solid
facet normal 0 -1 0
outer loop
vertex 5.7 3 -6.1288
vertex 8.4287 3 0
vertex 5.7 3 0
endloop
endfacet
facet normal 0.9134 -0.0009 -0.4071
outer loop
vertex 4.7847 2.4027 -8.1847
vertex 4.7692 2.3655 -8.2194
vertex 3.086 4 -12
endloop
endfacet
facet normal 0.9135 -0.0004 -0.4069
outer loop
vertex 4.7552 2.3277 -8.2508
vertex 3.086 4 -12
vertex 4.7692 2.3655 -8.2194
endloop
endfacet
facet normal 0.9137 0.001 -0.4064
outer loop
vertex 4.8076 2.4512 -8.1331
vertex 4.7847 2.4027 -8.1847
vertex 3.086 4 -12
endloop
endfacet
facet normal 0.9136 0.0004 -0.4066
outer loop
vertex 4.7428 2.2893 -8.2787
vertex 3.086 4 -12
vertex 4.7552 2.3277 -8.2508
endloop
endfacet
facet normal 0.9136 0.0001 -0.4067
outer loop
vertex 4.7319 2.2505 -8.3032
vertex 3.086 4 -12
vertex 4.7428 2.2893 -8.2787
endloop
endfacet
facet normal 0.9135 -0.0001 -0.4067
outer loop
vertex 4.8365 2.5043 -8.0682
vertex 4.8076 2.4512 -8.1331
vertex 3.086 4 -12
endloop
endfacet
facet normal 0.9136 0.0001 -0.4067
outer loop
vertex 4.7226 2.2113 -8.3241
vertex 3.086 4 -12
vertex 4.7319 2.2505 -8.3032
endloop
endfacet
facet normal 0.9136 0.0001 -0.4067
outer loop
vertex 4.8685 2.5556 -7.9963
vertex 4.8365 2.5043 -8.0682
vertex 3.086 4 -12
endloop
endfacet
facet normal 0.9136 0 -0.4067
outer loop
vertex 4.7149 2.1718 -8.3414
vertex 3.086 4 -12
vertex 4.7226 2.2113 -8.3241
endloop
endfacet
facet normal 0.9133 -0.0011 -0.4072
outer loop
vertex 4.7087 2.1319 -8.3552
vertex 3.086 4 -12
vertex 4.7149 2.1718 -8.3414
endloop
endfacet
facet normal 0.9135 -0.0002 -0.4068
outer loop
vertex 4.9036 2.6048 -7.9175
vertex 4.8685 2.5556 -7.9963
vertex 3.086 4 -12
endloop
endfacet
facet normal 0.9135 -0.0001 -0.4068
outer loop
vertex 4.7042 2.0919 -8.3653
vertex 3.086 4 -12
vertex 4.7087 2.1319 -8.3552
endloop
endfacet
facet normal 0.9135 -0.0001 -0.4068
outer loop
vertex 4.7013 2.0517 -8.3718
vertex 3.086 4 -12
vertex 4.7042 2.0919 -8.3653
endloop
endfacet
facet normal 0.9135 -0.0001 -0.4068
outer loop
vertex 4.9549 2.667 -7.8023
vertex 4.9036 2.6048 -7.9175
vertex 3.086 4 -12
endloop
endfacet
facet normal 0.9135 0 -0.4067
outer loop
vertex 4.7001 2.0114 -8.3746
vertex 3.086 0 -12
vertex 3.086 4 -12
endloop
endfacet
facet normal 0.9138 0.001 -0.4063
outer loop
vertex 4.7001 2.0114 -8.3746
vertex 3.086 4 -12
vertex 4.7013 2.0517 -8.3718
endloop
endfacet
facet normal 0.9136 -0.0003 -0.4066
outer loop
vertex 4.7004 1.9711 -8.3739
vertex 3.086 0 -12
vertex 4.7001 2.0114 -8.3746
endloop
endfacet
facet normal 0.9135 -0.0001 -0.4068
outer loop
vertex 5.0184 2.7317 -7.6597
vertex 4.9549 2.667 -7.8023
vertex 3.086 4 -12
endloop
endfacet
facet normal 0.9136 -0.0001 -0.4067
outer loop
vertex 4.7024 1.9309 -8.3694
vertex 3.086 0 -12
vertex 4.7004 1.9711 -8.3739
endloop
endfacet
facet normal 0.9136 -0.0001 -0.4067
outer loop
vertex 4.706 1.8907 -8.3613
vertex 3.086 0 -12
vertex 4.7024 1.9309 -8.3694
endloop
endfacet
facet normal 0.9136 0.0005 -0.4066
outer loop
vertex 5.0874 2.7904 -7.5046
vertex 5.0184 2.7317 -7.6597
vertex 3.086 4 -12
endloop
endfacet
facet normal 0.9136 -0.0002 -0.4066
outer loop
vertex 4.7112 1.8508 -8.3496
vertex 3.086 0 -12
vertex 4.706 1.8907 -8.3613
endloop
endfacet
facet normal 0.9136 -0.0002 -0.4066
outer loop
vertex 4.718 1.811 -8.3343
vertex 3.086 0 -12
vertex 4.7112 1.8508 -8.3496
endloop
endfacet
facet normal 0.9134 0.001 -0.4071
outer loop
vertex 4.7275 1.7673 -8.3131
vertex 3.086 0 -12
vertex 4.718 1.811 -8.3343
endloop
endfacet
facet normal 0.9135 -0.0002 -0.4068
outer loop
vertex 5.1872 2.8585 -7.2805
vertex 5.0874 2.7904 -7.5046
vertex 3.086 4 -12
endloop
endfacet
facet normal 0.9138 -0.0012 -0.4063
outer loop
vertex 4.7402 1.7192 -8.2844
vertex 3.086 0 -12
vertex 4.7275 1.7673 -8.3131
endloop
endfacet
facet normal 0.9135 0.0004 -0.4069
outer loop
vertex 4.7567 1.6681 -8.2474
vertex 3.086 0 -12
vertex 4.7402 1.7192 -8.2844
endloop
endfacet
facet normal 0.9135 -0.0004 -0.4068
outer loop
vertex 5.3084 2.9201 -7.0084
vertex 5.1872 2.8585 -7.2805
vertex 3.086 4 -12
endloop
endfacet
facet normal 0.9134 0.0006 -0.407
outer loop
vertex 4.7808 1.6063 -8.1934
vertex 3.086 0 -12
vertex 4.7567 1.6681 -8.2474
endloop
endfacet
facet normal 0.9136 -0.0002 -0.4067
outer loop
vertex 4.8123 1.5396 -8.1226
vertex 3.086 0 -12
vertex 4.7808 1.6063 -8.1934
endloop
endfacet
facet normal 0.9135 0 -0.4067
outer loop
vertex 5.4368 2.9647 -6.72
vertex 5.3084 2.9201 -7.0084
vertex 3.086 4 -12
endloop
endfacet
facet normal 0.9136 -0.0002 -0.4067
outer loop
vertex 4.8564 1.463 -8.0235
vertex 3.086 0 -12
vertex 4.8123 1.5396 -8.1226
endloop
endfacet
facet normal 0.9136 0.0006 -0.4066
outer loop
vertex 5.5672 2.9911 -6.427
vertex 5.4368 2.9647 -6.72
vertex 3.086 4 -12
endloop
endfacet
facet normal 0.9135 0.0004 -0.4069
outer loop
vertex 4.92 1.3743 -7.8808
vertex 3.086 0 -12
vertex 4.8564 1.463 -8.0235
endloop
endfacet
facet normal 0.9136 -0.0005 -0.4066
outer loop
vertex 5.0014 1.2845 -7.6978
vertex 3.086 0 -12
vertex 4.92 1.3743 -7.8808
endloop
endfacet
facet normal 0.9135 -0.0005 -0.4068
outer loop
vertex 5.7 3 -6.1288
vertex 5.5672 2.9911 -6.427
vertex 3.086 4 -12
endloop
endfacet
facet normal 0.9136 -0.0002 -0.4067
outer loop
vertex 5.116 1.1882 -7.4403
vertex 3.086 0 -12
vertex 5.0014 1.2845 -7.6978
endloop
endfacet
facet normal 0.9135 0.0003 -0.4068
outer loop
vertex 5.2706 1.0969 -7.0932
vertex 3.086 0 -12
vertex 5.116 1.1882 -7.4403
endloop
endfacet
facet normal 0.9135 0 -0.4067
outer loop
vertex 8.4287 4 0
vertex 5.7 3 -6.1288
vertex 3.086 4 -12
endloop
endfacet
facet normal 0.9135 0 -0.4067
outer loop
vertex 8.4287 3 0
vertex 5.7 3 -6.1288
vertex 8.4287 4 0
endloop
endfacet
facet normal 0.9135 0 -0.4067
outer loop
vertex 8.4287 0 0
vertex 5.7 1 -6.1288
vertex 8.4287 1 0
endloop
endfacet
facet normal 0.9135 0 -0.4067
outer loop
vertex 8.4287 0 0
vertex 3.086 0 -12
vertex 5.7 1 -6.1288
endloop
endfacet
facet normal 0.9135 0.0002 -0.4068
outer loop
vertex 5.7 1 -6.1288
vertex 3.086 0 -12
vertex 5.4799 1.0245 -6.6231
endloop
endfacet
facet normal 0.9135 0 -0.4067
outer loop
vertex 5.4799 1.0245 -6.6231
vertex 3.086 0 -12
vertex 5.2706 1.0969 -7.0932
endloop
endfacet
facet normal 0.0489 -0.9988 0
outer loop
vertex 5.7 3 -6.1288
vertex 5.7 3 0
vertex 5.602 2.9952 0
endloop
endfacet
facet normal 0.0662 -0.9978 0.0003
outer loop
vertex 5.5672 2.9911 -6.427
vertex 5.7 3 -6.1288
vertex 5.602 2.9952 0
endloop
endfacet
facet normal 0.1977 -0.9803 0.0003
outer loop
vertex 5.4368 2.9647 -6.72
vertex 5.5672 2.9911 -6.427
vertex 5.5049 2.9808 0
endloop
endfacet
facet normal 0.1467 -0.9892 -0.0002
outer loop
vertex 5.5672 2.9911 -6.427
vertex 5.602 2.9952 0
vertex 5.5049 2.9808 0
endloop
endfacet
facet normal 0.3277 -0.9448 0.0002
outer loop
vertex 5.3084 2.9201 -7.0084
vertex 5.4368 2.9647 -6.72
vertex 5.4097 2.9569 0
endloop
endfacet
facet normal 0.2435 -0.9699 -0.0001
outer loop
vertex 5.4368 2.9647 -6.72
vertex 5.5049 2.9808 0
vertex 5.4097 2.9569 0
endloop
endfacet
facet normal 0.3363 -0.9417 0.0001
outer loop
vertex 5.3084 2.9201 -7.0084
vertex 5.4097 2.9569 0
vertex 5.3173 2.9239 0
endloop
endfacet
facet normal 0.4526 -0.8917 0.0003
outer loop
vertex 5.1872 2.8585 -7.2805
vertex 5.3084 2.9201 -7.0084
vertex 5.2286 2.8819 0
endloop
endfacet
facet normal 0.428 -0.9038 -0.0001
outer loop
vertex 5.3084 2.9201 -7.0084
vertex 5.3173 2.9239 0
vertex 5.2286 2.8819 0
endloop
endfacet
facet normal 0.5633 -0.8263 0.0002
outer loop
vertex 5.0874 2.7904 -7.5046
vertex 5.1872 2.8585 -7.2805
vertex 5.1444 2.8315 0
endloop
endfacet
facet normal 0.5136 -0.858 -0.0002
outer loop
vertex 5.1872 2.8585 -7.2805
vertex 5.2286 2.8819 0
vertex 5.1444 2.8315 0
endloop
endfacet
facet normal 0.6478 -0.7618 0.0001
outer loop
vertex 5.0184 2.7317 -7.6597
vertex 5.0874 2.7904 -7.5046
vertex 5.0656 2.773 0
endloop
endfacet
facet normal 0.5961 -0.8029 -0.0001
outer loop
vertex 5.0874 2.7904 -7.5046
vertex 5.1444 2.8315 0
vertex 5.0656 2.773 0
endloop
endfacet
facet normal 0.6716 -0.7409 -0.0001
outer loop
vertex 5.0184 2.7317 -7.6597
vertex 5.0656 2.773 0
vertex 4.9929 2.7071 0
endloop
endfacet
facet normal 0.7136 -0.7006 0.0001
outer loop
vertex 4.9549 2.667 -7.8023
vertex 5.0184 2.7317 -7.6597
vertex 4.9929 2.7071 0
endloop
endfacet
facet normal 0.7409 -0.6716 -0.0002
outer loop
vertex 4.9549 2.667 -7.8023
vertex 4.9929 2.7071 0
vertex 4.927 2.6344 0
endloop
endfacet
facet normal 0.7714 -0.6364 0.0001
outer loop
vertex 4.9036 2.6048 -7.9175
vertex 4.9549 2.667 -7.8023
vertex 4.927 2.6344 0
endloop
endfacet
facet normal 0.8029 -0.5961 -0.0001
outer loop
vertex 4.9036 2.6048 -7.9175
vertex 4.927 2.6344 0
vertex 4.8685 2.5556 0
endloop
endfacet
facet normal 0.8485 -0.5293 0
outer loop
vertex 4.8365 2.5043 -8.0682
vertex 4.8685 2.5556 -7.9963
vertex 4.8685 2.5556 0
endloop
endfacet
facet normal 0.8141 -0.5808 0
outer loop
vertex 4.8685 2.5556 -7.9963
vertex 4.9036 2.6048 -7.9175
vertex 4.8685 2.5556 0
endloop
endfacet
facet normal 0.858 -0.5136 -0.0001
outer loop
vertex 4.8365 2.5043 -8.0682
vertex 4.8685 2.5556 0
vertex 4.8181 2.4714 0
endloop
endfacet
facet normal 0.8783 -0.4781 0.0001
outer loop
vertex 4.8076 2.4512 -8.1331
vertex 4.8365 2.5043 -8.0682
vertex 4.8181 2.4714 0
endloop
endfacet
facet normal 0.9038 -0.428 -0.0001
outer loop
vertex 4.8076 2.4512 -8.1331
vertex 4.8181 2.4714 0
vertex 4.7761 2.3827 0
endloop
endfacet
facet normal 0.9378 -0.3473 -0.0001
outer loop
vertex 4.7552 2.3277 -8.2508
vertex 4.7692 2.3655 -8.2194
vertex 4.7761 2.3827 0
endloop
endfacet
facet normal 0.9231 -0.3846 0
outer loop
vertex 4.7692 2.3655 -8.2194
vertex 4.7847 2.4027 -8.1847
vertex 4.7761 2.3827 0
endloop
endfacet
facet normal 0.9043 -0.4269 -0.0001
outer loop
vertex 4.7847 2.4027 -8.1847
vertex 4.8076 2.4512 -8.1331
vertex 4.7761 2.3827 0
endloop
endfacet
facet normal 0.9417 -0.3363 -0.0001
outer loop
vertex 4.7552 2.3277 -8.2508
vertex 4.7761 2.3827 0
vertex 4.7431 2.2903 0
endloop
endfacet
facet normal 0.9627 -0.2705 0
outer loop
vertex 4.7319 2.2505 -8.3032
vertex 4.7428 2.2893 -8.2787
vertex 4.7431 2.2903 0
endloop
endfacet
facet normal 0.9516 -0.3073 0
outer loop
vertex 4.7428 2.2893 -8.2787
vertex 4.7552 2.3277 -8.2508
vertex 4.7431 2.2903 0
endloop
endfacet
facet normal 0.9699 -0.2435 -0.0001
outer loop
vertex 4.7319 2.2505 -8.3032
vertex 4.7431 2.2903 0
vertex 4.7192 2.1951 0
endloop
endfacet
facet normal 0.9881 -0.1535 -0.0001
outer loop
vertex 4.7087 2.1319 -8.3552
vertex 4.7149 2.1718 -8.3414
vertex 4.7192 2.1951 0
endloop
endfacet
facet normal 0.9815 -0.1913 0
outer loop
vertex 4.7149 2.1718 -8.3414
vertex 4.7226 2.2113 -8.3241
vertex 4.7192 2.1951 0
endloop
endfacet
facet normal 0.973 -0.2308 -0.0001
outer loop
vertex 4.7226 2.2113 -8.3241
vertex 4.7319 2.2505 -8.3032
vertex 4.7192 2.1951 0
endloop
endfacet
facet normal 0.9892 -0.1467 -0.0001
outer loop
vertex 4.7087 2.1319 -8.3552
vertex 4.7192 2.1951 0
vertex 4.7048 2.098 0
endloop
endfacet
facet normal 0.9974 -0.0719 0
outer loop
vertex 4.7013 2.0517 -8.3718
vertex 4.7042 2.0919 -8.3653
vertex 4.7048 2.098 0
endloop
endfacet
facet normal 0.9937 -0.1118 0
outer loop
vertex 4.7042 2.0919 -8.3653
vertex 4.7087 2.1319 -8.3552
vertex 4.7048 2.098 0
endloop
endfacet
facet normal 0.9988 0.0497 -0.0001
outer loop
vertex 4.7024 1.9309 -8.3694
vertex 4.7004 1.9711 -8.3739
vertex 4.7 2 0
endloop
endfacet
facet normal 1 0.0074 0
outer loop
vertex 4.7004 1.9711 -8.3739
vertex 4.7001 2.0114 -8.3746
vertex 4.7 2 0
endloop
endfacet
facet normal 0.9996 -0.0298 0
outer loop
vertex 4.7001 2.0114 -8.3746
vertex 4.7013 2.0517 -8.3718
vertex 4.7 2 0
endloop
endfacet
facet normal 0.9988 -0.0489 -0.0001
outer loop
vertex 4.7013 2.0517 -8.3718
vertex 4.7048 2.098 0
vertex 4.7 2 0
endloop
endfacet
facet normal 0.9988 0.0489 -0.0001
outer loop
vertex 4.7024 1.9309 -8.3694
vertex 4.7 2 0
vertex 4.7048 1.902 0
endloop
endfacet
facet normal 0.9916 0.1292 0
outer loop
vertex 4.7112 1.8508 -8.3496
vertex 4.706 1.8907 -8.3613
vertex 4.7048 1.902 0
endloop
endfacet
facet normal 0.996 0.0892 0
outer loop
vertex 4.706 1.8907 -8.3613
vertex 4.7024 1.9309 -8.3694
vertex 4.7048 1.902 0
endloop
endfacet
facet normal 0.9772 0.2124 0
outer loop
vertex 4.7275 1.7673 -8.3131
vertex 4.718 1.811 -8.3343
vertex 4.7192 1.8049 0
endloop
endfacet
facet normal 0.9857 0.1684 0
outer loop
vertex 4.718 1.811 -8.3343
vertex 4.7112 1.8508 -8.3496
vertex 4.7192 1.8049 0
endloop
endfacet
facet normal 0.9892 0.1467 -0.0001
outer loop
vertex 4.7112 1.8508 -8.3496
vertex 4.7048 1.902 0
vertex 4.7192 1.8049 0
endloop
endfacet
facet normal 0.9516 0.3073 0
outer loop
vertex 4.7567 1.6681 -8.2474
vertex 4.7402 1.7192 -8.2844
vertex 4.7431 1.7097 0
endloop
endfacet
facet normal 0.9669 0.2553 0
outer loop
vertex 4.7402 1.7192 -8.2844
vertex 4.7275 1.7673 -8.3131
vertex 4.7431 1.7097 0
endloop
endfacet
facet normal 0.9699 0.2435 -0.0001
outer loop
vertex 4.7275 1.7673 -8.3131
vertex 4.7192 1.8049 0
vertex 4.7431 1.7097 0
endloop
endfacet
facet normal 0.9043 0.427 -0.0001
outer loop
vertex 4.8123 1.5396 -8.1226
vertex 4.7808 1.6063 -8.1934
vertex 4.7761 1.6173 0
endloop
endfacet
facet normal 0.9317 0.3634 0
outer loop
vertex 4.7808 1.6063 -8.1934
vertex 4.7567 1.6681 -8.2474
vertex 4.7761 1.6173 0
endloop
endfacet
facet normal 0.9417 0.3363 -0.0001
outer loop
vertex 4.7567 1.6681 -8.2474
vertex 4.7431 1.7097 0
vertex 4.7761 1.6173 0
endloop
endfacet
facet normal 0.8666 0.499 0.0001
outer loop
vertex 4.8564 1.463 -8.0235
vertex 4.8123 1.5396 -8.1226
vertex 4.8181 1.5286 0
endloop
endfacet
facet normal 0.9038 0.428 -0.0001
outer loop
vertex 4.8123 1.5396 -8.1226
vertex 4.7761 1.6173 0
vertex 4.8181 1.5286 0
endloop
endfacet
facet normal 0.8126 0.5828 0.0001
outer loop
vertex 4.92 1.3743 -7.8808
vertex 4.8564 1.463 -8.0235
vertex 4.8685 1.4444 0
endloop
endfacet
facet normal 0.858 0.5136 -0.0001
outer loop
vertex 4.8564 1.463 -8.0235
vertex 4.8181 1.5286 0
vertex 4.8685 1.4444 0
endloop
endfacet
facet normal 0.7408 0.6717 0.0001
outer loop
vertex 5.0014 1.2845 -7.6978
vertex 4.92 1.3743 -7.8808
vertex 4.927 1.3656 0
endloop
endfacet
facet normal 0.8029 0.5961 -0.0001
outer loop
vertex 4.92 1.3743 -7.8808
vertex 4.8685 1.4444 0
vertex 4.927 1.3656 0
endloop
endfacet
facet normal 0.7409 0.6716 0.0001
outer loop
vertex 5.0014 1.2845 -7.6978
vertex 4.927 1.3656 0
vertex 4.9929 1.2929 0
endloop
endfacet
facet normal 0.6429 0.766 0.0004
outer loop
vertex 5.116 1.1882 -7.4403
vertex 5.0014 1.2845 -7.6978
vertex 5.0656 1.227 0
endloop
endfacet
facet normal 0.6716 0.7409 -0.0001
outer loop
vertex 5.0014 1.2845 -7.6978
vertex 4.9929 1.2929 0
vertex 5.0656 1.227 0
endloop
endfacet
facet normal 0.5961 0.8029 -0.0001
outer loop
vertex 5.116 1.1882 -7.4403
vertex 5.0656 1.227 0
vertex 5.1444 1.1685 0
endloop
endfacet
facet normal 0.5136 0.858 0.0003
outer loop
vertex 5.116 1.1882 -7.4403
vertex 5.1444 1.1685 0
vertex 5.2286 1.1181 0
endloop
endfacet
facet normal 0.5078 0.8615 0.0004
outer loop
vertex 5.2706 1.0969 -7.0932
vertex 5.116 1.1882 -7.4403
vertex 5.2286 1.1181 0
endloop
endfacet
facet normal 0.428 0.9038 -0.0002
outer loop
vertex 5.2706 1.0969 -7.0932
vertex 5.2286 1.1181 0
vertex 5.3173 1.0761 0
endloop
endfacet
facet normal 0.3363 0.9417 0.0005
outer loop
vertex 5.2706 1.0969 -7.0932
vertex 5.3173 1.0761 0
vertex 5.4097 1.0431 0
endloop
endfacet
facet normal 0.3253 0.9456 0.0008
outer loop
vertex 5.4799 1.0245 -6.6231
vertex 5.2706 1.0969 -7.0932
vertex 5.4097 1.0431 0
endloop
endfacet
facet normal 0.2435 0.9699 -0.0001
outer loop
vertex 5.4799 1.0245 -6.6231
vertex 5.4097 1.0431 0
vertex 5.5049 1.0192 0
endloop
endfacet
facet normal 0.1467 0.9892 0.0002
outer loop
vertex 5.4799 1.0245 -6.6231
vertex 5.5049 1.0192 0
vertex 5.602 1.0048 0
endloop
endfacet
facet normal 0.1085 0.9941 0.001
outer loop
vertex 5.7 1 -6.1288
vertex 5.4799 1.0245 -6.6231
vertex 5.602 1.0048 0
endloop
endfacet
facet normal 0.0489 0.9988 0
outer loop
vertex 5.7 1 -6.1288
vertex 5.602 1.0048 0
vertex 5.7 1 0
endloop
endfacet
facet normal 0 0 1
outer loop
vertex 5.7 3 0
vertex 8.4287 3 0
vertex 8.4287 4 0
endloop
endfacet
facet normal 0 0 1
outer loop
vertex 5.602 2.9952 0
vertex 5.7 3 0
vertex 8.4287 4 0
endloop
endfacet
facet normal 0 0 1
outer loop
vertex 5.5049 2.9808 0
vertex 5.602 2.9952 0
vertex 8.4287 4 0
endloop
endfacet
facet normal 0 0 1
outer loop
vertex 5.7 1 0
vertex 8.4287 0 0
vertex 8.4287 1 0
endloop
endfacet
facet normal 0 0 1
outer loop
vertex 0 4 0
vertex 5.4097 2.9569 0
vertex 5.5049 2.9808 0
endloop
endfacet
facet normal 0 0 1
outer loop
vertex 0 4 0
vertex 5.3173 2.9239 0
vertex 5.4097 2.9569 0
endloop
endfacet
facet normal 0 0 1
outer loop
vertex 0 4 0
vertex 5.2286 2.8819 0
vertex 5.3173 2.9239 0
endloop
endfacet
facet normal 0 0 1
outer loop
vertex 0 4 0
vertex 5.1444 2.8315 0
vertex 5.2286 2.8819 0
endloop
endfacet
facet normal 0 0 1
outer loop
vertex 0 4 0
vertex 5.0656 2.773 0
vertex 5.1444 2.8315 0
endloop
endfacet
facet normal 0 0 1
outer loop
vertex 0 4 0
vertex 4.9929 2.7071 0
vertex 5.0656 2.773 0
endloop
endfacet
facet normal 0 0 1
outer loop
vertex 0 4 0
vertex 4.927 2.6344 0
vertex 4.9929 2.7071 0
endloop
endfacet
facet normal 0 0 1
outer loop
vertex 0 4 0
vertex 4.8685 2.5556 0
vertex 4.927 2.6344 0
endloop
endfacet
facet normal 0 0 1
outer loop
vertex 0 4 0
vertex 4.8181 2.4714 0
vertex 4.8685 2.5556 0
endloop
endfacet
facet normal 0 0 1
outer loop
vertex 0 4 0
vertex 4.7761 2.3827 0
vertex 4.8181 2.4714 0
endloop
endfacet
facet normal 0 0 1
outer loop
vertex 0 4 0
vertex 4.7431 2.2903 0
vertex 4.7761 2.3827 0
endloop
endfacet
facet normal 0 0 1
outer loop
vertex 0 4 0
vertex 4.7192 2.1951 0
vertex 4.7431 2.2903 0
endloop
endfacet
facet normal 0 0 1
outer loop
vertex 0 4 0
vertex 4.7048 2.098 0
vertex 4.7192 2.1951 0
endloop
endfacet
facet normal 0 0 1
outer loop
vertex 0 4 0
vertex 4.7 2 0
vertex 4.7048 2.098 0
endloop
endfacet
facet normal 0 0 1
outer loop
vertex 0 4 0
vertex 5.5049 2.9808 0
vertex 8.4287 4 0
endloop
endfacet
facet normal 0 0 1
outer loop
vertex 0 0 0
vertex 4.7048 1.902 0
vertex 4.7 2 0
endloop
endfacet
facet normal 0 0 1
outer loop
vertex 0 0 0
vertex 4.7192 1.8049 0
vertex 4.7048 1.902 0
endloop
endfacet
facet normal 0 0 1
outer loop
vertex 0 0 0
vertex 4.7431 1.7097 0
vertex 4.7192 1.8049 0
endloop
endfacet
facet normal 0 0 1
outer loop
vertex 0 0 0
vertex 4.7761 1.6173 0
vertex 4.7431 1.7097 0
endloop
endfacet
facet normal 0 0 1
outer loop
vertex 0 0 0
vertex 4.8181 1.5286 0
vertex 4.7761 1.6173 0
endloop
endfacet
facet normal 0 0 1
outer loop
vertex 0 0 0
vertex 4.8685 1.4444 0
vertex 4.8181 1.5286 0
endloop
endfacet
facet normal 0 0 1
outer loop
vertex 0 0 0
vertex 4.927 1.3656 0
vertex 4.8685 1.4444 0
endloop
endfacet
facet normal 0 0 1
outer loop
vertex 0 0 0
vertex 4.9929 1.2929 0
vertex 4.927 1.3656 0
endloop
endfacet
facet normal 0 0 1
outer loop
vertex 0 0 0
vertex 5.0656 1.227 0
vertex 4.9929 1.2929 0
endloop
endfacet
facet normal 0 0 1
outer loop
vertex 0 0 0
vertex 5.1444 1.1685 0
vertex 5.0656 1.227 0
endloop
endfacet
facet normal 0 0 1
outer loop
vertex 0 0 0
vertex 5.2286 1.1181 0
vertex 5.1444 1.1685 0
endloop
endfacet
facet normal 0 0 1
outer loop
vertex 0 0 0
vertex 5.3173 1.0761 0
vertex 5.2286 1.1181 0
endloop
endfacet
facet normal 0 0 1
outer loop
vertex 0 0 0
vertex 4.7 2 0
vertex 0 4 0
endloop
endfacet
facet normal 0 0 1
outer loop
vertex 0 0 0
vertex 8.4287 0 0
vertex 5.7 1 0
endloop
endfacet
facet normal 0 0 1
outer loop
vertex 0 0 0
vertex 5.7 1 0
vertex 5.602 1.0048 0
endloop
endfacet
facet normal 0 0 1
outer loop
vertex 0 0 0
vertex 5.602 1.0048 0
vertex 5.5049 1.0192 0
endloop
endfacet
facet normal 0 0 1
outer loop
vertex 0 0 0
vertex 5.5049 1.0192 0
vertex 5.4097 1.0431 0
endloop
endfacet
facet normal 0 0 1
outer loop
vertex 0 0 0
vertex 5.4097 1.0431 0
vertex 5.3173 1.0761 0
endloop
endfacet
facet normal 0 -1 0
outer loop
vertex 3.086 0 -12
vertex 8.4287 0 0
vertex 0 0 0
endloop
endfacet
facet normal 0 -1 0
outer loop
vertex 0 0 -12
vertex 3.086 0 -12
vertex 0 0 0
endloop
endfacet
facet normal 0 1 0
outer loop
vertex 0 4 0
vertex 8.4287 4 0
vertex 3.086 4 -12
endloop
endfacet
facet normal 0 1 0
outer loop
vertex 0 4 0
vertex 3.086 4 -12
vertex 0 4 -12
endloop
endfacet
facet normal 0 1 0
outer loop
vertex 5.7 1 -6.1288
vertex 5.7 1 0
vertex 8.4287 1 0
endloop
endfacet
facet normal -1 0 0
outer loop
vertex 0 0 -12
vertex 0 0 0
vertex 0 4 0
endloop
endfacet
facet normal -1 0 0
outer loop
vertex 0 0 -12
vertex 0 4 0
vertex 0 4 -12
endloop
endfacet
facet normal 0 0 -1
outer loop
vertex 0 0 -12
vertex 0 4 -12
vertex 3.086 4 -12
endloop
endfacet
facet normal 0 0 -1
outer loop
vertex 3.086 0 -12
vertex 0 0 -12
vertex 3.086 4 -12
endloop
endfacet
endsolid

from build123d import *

# Parameters (mm, degrees)
EXTRUDE_1_DEPTH     = 4
SKETCH_2_R          = 1
CUT_EXTRUDE_1_DEPTH = 13
CUT_EXTRUDE_2_DEPTH = 13


with BuildPart() as part:
    # Эскиз1 → Бобышка-Вытянуть1 (new body)
    with BuildSketch(Plane(origin=(0, 0, 0), x_dir=(1, 0, 0), z_dir=(0, 1, 0))):
        Polygon((0, 0), (0, 12), (3.085955121, 12), (8.428699344, 0), align=None)
    extrude(amount=EXTRUDE_1_DEPTH)

    # Эскиз2 → Вырез-Вытянуть1 (cut, through all)
    with BuildSketch(Plane.XY):
        with Locations((5.7, 2)):
            Circle(SKETCH_2_R)
    extrude(amount=-CUT_EXTRUDE_1_DEPTH, mode=Mode.SUBTRACT)

    # Эскиз3 → Вырез-Вытянуть2 (cut, through all)
    with BuildSketch(Plane.XY):
        with BuildLine():
            Line((8.428699344, 3), (5.7, 3))
            ThreePointArc((5.7, 3), (6.407106781, 2.707106781), (6.7, 2))
            ThreePointArc((6.7, 2), (6.407106781, 1.292893219), (5.7, 1))
            Line((5.7, 1), (8.428699344, 1))
            Line((8.428699344, 1), (8.428699344, 3))
        make_face()
    extrude(amount=-CUT_EXTRUDE_2_DEPTH, mode=Mode.SUBTRACT)


solid = part.part
